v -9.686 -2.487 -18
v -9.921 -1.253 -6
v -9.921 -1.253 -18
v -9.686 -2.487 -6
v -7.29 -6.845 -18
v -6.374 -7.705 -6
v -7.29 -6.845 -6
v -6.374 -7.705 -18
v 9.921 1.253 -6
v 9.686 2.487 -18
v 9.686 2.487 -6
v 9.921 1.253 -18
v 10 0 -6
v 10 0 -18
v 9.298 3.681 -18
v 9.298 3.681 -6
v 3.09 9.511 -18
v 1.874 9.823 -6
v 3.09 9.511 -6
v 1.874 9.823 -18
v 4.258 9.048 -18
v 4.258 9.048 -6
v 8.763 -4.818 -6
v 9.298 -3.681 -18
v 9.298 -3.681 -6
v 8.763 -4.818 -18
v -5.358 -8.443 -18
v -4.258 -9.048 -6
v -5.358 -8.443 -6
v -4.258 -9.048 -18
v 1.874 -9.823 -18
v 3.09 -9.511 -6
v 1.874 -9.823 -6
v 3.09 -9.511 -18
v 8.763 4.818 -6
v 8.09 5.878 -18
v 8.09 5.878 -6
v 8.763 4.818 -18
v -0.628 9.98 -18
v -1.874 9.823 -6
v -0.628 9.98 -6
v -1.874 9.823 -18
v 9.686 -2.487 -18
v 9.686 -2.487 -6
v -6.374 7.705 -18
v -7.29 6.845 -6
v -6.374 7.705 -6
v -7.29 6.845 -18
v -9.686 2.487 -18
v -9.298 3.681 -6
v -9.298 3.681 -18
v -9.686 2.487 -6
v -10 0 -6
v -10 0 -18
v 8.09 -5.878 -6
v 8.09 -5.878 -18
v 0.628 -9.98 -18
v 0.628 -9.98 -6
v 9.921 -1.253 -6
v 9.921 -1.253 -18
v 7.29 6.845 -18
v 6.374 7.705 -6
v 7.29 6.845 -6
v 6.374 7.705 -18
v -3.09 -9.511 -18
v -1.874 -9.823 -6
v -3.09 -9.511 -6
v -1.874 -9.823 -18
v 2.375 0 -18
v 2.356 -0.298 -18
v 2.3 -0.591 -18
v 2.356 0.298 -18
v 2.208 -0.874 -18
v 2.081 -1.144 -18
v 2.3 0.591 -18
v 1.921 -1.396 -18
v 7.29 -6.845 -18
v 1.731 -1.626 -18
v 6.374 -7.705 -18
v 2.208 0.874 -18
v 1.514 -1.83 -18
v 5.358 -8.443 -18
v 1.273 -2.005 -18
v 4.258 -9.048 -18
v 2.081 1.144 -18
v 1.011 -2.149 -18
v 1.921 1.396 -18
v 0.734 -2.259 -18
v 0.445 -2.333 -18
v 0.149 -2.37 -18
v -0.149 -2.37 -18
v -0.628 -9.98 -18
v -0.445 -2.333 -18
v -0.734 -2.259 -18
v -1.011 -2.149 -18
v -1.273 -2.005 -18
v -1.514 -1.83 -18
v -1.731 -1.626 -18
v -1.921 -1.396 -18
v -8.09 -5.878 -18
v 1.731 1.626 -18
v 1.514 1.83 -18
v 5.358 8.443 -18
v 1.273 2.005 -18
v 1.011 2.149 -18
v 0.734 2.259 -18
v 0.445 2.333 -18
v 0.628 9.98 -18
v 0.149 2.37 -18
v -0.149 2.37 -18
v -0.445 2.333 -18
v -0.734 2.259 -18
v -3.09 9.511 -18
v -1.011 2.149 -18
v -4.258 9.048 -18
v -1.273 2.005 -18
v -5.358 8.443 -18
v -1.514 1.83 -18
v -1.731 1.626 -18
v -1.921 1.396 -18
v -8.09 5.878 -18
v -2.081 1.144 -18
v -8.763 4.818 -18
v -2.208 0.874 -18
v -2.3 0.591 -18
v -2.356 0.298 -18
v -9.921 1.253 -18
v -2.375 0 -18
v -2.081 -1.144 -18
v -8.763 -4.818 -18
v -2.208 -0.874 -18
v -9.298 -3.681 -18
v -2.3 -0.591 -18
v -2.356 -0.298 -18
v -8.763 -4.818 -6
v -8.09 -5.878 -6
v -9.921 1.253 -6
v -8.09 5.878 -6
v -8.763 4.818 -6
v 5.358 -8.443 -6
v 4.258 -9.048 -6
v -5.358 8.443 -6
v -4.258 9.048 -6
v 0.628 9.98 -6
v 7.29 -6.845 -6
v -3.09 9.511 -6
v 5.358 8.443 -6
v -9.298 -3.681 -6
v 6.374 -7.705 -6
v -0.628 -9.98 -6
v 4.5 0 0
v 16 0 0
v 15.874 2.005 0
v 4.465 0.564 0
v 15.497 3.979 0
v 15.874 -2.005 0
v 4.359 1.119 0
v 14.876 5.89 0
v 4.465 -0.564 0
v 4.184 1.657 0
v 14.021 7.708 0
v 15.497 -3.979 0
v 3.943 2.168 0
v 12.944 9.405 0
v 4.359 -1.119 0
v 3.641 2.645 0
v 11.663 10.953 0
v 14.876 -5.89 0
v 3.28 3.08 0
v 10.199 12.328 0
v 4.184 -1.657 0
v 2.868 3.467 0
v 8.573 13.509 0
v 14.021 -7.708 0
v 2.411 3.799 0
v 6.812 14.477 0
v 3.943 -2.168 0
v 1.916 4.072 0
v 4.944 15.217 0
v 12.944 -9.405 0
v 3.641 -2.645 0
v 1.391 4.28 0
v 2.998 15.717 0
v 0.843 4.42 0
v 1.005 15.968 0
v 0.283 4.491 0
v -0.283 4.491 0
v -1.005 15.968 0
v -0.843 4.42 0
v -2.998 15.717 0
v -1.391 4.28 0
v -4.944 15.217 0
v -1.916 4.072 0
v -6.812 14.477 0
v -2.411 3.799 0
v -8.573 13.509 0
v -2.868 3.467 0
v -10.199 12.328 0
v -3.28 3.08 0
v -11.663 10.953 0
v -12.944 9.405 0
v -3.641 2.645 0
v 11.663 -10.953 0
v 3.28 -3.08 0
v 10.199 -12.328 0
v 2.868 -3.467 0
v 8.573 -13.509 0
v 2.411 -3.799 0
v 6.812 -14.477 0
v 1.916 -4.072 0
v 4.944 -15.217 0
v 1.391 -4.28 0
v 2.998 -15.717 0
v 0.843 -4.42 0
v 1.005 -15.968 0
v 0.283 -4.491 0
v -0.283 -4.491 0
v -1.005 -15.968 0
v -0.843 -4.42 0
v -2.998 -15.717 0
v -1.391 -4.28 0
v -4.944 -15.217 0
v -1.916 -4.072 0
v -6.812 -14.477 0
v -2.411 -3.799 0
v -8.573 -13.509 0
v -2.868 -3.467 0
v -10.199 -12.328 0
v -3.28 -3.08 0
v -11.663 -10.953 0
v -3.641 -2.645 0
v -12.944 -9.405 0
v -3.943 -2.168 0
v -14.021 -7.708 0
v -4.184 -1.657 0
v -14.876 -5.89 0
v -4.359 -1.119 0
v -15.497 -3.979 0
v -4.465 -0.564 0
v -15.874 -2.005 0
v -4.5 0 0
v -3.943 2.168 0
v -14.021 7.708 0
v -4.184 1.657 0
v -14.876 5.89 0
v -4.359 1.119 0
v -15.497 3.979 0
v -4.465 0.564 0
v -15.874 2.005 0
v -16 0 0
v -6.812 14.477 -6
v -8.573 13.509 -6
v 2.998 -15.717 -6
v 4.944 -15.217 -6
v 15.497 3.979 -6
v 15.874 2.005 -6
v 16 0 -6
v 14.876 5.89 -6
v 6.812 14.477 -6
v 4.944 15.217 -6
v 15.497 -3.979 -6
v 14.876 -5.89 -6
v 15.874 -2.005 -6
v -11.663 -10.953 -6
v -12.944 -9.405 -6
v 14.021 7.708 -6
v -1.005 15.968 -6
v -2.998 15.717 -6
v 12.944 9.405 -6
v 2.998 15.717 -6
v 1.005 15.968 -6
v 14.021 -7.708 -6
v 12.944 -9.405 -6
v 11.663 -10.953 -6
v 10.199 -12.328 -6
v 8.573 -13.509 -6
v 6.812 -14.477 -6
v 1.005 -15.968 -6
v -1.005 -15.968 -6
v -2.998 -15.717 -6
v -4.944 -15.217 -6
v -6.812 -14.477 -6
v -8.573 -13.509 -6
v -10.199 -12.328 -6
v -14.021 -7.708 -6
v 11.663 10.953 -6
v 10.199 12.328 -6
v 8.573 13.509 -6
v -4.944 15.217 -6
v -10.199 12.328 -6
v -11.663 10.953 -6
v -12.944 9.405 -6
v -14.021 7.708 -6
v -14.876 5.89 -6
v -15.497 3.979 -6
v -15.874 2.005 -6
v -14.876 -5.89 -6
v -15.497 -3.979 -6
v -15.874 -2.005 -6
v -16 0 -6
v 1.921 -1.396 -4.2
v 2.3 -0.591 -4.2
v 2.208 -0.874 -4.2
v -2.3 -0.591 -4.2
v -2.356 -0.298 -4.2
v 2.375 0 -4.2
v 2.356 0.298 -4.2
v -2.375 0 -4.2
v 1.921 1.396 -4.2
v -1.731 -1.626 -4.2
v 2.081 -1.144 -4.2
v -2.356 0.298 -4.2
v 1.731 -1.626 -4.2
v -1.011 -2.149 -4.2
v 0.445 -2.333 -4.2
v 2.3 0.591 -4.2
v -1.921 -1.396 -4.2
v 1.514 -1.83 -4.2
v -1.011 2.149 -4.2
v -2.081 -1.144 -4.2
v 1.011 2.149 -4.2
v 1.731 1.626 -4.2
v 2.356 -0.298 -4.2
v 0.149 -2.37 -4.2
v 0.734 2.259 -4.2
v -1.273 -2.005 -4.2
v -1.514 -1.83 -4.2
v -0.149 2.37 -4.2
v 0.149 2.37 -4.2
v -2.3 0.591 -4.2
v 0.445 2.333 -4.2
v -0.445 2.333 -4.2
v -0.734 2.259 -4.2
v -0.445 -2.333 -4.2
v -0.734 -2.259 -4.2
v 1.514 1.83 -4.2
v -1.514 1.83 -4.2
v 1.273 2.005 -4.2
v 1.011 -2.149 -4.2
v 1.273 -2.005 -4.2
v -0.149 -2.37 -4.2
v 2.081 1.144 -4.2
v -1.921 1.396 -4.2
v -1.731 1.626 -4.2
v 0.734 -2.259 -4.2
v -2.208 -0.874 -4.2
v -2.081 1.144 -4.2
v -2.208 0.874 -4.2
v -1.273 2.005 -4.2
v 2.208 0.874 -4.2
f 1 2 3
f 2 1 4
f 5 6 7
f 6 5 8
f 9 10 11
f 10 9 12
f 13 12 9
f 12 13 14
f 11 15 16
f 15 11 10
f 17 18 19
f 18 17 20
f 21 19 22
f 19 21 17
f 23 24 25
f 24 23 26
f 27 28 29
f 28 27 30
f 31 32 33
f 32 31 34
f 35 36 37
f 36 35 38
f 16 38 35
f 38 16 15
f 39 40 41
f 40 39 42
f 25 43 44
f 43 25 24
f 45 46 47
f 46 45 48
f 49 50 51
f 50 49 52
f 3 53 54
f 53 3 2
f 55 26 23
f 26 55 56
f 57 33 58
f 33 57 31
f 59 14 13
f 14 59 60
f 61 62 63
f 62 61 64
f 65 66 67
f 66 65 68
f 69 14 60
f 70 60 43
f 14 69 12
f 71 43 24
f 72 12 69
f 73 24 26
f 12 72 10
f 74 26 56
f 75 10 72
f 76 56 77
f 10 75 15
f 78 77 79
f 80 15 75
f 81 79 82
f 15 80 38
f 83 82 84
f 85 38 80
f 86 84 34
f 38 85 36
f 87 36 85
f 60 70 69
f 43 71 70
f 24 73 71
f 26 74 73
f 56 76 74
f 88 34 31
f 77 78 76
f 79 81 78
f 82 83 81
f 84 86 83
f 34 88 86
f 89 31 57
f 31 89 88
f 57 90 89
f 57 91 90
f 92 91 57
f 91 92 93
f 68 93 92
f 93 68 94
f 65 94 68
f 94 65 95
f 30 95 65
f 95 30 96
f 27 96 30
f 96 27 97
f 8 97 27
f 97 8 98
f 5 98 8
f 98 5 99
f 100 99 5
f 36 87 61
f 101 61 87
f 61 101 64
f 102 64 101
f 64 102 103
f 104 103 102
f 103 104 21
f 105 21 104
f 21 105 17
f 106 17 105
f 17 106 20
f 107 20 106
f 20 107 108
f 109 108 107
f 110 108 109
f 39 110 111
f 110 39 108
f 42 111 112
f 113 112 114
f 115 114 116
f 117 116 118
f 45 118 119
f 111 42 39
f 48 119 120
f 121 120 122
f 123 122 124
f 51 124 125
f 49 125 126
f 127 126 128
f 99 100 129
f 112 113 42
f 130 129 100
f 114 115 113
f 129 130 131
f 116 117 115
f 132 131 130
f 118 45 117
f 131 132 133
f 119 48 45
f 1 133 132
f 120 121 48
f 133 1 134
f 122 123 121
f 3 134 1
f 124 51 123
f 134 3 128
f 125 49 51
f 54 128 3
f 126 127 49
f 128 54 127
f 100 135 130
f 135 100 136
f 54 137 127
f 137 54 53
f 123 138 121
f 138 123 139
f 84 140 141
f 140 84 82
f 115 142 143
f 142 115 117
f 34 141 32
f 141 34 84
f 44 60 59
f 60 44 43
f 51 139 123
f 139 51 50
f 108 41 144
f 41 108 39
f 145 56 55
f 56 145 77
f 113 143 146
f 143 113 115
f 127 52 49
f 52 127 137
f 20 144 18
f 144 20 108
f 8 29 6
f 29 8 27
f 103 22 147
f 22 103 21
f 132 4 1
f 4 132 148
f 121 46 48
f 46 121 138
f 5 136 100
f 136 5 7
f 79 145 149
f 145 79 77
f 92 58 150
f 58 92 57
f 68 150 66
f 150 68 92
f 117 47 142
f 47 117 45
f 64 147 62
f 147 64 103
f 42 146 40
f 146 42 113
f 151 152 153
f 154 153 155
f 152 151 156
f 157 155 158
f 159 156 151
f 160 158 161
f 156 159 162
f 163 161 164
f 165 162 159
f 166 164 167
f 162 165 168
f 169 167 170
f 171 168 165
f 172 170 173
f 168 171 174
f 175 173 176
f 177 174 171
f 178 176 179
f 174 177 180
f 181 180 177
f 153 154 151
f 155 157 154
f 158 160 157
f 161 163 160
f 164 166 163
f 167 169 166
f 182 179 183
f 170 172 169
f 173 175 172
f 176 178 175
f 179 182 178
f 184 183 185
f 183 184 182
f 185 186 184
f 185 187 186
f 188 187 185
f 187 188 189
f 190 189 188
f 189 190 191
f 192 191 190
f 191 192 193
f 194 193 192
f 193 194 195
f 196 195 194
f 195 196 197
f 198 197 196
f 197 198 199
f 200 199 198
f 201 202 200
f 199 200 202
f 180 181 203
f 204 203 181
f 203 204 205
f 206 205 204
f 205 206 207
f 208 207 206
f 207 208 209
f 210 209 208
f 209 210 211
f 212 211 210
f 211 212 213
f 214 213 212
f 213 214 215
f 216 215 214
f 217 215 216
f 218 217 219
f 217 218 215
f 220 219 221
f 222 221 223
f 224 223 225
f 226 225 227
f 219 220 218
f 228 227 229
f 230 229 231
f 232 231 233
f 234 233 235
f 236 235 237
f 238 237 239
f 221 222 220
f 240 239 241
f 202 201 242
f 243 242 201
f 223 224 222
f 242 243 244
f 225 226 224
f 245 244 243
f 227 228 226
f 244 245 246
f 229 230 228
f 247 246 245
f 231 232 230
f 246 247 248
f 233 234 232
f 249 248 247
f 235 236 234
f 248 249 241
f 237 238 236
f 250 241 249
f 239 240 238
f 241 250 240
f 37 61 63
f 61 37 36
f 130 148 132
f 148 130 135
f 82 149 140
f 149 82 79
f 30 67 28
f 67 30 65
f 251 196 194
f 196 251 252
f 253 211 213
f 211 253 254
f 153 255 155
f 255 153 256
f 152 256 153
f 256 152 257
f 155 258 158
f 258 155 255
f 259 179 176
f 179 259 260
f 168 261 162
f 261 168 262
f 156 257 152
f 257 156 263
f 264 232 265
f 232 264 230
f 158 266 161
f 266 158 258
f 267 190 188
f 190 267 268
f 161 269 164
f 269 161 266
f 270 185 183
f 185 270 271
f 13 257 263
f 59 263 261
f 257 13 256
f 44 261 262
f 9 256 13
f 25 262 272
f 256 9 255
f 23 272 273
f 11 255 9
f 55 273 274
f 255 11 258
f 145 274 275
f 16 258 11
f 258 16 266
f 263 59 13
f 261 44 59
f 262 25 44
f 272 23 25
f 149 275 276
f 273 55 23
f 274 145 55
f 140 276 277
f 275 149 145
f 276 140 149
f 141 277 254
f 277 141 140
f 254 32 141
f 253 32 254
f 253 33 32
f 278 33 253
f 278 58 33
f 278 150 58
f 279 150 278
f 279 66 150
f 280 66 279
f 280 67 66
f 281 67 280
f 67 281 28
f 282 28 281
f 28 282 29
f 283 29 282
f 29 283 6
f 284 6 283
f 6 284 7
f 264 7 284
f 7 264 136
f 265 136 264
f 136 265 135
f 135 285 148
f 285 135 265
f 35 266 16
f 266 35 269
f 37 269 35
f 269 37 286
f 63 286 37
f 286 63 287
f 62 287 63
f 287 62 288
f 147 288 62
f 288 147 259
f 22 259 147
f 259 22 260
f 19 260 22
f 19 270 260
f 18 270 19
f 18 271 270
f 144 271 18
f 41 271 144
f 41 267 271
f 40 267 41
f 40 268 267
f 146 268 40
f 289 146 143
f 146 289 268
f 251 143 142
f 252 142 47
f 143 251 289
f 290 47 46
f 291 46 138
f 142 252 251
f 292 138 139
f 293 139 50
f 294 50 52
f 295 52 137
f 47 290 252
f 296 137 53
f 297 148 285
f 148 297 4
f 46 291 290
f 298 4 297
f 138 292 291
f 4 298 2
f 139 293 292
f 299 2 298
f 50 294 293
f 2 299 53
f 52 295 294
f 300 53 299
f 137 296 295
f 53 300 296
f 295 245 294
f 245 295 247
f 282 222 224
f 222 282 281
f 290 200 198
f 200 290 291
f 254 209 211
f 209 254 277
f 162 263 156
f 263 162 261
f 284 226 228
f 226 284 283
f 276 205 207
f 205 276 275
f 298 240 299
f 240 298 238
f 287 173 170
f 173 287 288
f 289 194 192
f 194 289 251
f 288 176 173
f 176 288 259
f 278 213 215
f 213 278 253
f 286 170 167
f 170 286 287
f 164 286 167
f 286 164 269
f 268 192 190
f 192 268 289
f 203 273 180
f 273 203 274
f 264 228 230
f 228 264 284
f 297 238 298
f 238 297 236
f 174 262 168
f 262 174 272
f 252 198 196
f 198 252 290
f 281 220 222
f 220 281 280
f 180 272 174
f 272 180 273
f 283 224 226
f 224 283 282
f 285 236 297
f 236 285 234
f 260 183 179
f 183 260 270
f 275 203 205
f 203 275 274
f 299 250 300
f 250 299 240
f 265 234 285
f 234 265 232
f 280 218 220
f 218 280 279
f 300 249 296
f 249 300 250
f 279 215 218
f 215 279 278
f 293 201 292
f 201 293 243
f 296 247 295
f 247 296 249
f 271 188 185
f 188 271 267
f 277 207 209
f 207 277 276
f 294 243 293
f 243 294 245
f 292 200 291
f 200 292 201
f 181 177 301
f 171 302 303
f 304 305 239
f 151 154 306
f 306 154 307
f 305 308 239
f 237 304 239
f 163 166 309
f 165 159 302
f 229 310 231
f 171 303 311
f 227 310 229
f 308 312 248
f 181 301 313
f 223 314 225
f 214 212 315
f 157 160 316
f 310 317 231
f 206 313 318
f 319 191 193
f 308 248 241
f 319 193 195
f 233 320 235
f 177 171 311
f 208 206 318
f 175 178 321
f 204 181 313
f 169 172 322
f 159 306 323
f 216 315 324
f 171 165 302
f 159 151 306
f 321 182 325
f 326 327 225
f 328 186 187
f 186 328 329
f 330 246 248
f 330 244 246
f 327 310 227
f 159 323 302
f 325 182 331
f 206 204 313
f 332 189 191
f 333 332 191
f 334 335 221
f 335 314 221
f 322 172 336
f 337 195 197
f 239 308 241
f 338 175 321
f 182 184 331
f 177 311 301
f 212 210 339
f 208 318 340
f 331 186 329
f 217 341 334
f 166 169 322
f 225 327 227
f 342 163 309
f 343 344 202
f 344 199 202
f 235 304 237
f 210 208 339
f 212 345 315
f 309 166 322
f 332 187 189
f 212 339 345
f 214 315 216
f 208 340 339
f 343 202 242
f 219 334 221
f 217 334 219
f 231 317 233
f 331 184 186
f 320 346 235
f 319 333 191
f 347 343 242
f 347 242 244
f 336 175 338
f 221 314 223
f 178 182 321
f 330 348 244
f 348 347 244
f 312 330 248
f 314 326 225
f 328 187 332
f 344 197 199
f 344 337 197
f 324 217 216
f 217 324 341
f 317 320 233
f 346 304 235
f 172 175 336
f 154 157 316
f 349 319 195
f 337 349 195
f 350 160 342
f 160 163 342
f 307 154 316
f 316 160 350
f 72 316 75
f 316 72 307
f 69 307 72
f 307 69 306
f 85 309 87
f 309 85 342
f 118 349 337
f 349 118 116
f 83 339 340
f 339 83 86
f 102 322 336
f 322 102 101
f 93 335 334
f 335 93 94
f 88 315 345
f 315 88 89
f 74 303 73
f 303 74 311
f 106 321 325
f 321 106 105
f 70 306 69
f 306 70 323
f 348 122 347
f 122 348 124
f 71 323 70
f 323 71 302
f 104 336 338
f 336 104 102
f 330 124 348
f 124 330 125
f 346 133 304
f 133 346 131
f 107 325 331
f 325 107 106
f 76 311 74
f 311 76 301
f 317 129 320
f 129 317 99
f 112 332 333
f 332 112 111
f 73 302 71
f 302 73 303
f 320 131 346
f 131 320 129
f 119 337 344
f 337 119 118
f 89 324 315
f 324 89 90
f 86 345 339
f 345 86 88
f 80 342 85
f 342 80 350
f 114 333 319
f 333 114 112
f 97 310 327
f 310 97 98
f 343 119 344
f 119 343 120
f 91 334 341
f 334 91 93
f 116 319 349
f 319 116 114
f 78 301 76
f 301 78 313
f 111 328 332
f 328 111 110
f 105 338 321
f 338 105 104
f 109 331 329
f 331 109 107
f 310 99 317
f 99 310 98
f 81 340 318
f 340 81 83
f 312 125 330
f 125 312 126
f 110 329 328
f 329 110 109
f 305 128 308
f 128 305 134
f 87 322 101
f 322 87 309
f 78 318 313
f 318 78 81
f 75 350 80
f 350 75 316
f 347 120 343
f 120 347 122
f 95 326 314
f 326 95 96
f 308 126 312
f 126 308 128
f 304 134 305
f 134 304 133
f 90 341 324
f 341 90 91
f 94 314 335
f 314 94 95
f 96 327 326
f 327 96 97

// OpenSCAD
$fn = 50;


difference() {
	union() {
		translate(v = [0, 0, -18.0000000000]) {
			cylinder(h = 18, r = 10.0000000000);
		}
		translate(v = [0, 0, -6.0000000000]) {
			cylinder(h = 6, r = 16.0000000000);
		}
	}
	union() {
		translate(v = [0, 0, 0]) {
			rotate(a = [0, 0, 0]) {
				difference() {
					union() {
						#translate(v = [0, 0, -18.0000000000]) {
							cylinder(h = 18, r = 2.2500000000);
						}
						#translate(v = [0, 0, -4.2000000000]) {
							cylinder(h = 4.2000000000, r = 10.0000000000, r1 = 2.3750000000, r2 = 4.5000000000);
						}
						#translate(v = [0, 0, -18.0000000000]) {
							cylinder(h = 18, r = 2.3750000000);
						}
						#translate(v = [0, 0, -18.0000000000]) {
							cylinder(h = 18, r = 2.2500000000);
						}
					}
					union();
				}
			}
		}
	}
}
